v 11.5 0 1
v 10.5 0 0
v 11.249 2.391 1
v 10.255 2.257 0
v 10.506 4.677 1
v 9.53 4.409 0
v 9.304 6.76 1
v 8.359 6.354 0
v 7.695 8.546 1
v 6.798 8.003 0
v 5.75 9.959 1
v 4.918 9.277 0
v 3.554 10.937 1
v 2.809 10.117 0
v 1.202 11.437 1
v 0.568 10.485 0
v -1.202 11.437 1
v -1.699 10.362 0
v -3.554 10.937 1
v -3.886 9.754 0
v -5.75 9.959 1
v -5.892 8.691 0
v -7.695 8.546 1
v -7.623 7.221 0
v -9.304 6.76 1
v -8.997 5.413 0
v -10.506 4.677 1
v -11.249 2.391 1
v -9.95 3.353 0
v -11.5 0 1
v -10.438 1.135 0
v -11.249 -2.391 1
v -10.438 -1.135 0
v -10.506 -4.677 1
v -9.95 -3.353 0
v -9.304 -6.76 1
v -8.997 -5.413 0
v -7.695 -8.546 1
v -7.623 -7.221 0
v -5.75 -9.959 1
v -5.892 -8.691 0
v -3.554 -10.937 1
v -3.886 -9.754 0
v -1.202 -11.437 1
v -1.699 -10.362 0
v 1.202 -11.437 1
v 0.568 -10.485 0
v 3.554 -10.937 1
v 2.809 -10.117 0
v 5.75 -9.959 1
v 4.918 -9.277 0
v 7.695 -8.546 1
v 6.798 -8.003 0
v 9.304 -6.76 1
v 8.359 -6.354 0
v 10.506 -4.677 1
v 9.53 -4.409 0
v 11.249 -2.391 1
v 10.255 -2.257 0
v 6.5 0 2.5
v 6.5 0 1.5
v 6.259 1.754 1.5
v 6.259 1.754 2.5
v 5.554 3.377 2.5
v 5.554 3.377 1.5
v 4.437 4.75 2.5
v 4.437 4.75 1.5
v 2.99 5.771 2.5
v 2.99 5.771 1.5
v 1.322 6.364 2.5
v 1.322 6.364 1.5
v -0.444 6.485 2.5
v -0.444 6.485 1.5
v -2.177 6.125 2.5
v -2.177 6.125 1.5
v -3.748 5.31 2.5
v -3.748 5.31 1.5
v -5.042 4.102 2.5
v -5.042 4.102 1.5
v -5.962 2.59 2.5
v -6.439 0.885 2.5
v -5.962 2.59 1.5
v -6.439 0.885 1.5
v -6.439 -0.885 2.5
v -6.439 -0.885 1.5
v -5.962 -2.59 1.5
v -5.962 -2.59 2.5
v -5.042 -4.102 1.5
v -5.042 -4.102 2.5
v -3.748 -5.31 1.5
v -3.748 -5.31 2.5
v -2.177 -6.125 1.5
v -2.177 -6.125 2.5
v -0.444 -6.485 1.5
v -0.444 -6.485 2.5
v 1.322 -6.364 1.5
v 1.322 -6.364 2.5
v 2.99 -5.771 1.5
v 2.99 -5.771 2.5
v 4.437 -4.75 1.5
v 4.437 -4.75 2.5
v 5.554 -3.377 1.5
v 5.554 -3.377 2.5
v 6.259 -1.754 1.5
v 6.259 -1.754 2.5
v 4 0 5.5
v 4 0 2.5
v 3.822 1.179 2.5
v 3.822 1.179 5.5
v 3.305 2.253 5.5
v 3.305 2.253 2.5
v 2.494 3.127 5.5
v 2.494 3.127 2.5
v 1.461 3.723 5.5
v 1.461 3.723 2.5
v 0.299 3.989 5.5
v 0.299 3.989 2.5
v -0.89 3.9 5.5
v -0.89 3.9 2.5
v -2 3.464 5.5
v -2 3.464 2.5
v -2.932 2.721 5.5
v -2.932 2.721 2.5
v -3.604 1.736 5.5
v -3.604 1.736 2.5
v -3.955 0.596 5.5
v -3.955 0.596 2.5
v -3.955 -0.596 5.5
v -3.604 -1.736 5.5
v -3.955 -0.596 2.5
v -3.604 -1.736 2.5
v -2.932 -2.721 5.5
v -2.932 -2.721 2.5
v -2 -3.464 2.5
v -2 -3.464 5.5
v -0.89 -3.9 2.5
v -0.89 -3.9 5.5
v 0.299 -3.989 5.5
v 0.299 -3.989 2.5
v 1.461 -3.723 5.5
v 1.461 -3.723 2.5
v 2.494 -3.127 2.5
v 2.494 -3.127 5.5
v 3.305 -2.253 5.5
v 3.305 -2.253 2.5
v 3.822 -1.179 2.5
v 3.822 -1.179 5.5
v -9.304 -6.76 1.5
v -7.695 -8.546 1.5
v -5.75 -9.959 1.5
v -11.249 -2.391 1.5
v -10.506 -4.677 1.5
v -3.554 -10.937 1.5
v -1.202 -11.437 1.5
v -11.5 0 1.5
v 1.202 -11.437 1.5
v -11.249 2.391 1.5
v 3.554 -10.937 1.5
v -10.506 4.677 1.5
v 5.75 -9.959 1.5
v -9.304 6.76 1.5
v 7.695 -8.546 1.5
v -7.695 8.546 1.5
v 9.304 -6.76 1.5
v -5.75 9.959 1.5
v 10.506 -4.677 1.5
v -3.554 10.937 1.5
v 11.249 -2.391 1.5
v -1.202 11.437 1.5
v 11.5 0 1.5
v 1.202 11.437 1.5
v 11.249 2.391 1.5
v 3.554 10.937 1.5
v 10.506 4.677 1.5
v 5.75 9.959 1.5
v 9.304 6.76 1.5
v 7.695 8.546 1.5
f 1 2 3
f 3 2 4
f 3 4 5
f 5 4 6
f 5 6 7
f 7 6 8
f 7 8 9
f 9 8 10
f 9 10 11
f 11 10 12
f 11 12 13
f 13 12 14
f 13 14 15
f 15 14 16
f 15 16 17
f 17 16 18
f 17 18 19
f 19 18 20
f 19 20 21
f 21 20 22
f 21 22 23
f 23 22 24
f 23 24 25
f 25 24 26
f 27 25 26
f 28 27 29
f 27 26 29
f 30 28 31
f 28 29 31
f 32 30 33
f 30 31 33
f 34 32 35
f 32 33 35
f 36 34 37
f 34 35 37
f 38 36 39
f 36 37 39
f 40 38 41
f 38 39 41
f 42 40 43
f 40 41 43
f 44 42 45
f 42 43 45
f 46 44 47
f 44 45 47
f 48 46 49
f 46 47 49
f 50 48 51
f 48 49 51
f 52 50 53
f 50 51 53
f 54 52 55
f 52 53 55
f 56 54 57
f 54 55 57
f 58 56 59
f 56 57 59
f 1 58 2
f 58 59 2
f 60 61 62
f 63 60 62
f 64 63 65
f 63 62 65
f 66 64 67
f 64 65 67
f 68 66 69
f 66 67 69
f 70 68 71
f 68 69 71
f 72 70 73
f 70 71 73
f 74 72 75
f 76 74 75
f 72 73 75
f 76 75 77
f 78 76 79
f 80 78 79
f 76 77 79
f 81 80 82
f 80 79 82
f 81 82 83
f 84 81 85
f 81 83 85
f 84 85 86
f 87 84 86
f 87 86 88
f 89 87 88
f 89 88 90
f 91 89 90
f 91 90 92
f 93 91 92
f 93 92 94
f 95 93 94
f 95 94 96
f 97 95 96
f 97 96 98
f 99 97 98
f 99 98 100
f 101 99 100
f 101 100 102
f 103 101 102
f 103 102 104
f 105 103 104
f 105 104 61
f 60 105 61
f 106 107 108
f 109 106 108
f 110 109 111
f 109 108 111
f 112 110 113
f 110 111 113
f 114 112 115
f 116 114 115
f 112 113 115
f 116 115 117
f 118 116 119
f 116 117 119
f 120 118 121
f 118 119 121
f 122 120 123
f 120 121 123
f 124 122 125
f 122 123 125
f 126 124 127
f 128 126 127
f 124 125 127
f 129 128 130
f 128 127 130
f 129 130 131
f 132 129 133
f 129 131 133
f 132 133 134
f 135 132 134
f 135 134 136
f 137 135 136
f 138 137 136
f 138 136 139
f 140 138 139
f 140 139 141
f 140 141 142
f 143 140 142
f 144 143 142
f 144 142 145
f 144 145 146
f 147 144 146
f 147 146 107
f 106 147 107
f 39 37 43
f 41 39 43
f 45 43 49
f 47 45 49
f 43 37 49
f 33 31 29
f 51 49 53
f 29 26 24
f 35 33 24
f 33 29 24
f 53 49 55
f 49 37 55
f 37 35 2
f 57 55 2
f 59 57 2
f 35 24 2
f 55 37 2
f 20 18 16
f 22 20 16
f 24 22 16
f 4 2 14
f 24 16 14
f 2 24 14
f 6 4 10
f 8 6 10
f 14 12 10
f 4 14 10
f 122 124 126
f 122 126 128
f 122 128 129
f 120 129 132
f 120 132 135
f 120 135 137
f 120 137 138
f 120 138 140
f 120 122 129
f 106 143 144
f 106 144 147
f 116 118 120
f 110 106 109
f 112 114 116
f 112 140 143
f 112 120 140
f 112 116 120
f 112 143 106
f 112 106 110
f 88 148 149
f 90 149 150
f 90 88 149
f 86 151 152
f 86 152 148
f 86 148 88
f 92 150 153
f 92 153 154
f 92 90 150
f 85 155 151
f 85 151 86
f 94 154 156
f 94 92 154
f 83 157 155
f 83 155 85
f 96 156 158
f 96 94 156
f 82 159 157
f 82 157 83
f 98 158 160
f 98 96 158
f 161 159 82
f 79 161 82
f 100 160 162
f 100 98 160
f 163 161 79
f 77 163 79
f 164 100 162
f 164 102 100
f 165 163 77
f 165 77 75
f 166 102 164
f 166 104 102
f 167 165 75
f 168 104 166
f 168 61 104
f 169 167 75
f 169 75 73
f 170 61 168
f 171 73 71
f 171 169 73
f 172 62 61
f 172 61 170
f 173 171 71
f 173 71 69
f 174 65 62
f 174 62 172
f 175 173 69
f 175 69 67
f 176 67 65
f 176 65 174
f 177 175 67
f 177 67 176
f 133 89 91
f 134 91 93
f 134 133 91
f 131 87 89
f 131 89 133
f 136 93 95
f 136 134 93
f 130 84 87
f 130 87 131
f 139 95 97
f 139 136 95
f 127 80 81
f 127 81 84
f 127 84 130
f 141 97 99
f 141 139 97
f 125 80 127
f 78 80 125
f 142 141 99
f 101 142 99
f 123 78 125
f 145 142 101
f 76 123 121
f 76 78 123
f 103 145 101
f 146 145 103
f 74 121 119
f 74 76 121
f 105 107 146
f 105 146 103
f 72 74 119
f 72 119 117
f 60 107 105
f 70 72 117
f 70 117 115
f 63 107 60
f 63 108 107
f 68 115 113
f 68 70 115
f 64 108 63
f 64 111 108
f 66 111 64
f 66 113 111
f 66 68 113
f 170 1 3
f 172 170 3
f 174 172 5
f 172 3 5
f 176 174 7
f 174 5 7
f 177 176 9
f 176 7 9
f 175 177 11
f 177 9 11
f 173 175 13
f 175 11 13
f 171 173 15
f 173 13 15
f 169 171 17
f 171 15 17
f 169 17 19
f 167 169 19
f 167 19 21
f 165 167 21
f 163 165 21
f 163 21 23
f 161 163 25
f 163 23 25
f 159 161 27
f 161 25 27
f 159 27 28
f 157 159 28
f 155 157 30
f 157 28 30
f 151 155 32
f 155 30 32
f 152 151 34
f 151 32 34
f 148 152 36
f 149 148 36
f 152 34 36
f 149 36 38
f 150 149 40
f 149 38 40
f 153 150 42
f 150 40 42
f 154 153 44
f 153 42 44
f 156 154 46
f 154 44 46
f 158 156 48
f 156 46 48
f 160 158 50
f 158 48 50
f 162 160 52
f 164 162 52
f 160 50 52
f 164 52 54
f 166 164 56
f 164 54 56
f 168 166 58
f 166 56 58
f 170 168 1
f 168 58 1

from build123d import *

# Parameters (mm, degrees)
F0_R     = 11.5
F0_R_2   = 6.5
F1_DEPTH = 1.5
F0_R_3   = 4
F2_DEPTH = 2.5
F3_DEPTH = 5.5
F4_SIZE  = 1


with BuildPart() as f1:
    # F0 (on Top) → F1 (new body)
    with BuildSketch(Plane.XY):
        Circle(F0_R)
        Circle(F0_R_2, mode=Mode.SUBTRACT)
    extrude(amount=F1_DEPTH)

    # F0 (on Top) → F2 (join)
    with BuildSketch(Plane.XY):
        Circle(F0_R_2)
        Circle(F0_R_3, mode=Mode.SUBTRACT)
    extrude(amount=F2_DEPTH)

    # F0 (on Top) → F3 (join)
    with BuildSketch(Plane.XY):
        Circle(F0_R_3)
    extrude(amount=F3_DEPTH)

    # F4
    f4_edges = [f1.edges().sort_by_distance(p)[0] for p in [
        (-11.5, 0, 0),
    ]]
    chamfer(f4_edges, length=F4_SIZE)


solid = f1.part
